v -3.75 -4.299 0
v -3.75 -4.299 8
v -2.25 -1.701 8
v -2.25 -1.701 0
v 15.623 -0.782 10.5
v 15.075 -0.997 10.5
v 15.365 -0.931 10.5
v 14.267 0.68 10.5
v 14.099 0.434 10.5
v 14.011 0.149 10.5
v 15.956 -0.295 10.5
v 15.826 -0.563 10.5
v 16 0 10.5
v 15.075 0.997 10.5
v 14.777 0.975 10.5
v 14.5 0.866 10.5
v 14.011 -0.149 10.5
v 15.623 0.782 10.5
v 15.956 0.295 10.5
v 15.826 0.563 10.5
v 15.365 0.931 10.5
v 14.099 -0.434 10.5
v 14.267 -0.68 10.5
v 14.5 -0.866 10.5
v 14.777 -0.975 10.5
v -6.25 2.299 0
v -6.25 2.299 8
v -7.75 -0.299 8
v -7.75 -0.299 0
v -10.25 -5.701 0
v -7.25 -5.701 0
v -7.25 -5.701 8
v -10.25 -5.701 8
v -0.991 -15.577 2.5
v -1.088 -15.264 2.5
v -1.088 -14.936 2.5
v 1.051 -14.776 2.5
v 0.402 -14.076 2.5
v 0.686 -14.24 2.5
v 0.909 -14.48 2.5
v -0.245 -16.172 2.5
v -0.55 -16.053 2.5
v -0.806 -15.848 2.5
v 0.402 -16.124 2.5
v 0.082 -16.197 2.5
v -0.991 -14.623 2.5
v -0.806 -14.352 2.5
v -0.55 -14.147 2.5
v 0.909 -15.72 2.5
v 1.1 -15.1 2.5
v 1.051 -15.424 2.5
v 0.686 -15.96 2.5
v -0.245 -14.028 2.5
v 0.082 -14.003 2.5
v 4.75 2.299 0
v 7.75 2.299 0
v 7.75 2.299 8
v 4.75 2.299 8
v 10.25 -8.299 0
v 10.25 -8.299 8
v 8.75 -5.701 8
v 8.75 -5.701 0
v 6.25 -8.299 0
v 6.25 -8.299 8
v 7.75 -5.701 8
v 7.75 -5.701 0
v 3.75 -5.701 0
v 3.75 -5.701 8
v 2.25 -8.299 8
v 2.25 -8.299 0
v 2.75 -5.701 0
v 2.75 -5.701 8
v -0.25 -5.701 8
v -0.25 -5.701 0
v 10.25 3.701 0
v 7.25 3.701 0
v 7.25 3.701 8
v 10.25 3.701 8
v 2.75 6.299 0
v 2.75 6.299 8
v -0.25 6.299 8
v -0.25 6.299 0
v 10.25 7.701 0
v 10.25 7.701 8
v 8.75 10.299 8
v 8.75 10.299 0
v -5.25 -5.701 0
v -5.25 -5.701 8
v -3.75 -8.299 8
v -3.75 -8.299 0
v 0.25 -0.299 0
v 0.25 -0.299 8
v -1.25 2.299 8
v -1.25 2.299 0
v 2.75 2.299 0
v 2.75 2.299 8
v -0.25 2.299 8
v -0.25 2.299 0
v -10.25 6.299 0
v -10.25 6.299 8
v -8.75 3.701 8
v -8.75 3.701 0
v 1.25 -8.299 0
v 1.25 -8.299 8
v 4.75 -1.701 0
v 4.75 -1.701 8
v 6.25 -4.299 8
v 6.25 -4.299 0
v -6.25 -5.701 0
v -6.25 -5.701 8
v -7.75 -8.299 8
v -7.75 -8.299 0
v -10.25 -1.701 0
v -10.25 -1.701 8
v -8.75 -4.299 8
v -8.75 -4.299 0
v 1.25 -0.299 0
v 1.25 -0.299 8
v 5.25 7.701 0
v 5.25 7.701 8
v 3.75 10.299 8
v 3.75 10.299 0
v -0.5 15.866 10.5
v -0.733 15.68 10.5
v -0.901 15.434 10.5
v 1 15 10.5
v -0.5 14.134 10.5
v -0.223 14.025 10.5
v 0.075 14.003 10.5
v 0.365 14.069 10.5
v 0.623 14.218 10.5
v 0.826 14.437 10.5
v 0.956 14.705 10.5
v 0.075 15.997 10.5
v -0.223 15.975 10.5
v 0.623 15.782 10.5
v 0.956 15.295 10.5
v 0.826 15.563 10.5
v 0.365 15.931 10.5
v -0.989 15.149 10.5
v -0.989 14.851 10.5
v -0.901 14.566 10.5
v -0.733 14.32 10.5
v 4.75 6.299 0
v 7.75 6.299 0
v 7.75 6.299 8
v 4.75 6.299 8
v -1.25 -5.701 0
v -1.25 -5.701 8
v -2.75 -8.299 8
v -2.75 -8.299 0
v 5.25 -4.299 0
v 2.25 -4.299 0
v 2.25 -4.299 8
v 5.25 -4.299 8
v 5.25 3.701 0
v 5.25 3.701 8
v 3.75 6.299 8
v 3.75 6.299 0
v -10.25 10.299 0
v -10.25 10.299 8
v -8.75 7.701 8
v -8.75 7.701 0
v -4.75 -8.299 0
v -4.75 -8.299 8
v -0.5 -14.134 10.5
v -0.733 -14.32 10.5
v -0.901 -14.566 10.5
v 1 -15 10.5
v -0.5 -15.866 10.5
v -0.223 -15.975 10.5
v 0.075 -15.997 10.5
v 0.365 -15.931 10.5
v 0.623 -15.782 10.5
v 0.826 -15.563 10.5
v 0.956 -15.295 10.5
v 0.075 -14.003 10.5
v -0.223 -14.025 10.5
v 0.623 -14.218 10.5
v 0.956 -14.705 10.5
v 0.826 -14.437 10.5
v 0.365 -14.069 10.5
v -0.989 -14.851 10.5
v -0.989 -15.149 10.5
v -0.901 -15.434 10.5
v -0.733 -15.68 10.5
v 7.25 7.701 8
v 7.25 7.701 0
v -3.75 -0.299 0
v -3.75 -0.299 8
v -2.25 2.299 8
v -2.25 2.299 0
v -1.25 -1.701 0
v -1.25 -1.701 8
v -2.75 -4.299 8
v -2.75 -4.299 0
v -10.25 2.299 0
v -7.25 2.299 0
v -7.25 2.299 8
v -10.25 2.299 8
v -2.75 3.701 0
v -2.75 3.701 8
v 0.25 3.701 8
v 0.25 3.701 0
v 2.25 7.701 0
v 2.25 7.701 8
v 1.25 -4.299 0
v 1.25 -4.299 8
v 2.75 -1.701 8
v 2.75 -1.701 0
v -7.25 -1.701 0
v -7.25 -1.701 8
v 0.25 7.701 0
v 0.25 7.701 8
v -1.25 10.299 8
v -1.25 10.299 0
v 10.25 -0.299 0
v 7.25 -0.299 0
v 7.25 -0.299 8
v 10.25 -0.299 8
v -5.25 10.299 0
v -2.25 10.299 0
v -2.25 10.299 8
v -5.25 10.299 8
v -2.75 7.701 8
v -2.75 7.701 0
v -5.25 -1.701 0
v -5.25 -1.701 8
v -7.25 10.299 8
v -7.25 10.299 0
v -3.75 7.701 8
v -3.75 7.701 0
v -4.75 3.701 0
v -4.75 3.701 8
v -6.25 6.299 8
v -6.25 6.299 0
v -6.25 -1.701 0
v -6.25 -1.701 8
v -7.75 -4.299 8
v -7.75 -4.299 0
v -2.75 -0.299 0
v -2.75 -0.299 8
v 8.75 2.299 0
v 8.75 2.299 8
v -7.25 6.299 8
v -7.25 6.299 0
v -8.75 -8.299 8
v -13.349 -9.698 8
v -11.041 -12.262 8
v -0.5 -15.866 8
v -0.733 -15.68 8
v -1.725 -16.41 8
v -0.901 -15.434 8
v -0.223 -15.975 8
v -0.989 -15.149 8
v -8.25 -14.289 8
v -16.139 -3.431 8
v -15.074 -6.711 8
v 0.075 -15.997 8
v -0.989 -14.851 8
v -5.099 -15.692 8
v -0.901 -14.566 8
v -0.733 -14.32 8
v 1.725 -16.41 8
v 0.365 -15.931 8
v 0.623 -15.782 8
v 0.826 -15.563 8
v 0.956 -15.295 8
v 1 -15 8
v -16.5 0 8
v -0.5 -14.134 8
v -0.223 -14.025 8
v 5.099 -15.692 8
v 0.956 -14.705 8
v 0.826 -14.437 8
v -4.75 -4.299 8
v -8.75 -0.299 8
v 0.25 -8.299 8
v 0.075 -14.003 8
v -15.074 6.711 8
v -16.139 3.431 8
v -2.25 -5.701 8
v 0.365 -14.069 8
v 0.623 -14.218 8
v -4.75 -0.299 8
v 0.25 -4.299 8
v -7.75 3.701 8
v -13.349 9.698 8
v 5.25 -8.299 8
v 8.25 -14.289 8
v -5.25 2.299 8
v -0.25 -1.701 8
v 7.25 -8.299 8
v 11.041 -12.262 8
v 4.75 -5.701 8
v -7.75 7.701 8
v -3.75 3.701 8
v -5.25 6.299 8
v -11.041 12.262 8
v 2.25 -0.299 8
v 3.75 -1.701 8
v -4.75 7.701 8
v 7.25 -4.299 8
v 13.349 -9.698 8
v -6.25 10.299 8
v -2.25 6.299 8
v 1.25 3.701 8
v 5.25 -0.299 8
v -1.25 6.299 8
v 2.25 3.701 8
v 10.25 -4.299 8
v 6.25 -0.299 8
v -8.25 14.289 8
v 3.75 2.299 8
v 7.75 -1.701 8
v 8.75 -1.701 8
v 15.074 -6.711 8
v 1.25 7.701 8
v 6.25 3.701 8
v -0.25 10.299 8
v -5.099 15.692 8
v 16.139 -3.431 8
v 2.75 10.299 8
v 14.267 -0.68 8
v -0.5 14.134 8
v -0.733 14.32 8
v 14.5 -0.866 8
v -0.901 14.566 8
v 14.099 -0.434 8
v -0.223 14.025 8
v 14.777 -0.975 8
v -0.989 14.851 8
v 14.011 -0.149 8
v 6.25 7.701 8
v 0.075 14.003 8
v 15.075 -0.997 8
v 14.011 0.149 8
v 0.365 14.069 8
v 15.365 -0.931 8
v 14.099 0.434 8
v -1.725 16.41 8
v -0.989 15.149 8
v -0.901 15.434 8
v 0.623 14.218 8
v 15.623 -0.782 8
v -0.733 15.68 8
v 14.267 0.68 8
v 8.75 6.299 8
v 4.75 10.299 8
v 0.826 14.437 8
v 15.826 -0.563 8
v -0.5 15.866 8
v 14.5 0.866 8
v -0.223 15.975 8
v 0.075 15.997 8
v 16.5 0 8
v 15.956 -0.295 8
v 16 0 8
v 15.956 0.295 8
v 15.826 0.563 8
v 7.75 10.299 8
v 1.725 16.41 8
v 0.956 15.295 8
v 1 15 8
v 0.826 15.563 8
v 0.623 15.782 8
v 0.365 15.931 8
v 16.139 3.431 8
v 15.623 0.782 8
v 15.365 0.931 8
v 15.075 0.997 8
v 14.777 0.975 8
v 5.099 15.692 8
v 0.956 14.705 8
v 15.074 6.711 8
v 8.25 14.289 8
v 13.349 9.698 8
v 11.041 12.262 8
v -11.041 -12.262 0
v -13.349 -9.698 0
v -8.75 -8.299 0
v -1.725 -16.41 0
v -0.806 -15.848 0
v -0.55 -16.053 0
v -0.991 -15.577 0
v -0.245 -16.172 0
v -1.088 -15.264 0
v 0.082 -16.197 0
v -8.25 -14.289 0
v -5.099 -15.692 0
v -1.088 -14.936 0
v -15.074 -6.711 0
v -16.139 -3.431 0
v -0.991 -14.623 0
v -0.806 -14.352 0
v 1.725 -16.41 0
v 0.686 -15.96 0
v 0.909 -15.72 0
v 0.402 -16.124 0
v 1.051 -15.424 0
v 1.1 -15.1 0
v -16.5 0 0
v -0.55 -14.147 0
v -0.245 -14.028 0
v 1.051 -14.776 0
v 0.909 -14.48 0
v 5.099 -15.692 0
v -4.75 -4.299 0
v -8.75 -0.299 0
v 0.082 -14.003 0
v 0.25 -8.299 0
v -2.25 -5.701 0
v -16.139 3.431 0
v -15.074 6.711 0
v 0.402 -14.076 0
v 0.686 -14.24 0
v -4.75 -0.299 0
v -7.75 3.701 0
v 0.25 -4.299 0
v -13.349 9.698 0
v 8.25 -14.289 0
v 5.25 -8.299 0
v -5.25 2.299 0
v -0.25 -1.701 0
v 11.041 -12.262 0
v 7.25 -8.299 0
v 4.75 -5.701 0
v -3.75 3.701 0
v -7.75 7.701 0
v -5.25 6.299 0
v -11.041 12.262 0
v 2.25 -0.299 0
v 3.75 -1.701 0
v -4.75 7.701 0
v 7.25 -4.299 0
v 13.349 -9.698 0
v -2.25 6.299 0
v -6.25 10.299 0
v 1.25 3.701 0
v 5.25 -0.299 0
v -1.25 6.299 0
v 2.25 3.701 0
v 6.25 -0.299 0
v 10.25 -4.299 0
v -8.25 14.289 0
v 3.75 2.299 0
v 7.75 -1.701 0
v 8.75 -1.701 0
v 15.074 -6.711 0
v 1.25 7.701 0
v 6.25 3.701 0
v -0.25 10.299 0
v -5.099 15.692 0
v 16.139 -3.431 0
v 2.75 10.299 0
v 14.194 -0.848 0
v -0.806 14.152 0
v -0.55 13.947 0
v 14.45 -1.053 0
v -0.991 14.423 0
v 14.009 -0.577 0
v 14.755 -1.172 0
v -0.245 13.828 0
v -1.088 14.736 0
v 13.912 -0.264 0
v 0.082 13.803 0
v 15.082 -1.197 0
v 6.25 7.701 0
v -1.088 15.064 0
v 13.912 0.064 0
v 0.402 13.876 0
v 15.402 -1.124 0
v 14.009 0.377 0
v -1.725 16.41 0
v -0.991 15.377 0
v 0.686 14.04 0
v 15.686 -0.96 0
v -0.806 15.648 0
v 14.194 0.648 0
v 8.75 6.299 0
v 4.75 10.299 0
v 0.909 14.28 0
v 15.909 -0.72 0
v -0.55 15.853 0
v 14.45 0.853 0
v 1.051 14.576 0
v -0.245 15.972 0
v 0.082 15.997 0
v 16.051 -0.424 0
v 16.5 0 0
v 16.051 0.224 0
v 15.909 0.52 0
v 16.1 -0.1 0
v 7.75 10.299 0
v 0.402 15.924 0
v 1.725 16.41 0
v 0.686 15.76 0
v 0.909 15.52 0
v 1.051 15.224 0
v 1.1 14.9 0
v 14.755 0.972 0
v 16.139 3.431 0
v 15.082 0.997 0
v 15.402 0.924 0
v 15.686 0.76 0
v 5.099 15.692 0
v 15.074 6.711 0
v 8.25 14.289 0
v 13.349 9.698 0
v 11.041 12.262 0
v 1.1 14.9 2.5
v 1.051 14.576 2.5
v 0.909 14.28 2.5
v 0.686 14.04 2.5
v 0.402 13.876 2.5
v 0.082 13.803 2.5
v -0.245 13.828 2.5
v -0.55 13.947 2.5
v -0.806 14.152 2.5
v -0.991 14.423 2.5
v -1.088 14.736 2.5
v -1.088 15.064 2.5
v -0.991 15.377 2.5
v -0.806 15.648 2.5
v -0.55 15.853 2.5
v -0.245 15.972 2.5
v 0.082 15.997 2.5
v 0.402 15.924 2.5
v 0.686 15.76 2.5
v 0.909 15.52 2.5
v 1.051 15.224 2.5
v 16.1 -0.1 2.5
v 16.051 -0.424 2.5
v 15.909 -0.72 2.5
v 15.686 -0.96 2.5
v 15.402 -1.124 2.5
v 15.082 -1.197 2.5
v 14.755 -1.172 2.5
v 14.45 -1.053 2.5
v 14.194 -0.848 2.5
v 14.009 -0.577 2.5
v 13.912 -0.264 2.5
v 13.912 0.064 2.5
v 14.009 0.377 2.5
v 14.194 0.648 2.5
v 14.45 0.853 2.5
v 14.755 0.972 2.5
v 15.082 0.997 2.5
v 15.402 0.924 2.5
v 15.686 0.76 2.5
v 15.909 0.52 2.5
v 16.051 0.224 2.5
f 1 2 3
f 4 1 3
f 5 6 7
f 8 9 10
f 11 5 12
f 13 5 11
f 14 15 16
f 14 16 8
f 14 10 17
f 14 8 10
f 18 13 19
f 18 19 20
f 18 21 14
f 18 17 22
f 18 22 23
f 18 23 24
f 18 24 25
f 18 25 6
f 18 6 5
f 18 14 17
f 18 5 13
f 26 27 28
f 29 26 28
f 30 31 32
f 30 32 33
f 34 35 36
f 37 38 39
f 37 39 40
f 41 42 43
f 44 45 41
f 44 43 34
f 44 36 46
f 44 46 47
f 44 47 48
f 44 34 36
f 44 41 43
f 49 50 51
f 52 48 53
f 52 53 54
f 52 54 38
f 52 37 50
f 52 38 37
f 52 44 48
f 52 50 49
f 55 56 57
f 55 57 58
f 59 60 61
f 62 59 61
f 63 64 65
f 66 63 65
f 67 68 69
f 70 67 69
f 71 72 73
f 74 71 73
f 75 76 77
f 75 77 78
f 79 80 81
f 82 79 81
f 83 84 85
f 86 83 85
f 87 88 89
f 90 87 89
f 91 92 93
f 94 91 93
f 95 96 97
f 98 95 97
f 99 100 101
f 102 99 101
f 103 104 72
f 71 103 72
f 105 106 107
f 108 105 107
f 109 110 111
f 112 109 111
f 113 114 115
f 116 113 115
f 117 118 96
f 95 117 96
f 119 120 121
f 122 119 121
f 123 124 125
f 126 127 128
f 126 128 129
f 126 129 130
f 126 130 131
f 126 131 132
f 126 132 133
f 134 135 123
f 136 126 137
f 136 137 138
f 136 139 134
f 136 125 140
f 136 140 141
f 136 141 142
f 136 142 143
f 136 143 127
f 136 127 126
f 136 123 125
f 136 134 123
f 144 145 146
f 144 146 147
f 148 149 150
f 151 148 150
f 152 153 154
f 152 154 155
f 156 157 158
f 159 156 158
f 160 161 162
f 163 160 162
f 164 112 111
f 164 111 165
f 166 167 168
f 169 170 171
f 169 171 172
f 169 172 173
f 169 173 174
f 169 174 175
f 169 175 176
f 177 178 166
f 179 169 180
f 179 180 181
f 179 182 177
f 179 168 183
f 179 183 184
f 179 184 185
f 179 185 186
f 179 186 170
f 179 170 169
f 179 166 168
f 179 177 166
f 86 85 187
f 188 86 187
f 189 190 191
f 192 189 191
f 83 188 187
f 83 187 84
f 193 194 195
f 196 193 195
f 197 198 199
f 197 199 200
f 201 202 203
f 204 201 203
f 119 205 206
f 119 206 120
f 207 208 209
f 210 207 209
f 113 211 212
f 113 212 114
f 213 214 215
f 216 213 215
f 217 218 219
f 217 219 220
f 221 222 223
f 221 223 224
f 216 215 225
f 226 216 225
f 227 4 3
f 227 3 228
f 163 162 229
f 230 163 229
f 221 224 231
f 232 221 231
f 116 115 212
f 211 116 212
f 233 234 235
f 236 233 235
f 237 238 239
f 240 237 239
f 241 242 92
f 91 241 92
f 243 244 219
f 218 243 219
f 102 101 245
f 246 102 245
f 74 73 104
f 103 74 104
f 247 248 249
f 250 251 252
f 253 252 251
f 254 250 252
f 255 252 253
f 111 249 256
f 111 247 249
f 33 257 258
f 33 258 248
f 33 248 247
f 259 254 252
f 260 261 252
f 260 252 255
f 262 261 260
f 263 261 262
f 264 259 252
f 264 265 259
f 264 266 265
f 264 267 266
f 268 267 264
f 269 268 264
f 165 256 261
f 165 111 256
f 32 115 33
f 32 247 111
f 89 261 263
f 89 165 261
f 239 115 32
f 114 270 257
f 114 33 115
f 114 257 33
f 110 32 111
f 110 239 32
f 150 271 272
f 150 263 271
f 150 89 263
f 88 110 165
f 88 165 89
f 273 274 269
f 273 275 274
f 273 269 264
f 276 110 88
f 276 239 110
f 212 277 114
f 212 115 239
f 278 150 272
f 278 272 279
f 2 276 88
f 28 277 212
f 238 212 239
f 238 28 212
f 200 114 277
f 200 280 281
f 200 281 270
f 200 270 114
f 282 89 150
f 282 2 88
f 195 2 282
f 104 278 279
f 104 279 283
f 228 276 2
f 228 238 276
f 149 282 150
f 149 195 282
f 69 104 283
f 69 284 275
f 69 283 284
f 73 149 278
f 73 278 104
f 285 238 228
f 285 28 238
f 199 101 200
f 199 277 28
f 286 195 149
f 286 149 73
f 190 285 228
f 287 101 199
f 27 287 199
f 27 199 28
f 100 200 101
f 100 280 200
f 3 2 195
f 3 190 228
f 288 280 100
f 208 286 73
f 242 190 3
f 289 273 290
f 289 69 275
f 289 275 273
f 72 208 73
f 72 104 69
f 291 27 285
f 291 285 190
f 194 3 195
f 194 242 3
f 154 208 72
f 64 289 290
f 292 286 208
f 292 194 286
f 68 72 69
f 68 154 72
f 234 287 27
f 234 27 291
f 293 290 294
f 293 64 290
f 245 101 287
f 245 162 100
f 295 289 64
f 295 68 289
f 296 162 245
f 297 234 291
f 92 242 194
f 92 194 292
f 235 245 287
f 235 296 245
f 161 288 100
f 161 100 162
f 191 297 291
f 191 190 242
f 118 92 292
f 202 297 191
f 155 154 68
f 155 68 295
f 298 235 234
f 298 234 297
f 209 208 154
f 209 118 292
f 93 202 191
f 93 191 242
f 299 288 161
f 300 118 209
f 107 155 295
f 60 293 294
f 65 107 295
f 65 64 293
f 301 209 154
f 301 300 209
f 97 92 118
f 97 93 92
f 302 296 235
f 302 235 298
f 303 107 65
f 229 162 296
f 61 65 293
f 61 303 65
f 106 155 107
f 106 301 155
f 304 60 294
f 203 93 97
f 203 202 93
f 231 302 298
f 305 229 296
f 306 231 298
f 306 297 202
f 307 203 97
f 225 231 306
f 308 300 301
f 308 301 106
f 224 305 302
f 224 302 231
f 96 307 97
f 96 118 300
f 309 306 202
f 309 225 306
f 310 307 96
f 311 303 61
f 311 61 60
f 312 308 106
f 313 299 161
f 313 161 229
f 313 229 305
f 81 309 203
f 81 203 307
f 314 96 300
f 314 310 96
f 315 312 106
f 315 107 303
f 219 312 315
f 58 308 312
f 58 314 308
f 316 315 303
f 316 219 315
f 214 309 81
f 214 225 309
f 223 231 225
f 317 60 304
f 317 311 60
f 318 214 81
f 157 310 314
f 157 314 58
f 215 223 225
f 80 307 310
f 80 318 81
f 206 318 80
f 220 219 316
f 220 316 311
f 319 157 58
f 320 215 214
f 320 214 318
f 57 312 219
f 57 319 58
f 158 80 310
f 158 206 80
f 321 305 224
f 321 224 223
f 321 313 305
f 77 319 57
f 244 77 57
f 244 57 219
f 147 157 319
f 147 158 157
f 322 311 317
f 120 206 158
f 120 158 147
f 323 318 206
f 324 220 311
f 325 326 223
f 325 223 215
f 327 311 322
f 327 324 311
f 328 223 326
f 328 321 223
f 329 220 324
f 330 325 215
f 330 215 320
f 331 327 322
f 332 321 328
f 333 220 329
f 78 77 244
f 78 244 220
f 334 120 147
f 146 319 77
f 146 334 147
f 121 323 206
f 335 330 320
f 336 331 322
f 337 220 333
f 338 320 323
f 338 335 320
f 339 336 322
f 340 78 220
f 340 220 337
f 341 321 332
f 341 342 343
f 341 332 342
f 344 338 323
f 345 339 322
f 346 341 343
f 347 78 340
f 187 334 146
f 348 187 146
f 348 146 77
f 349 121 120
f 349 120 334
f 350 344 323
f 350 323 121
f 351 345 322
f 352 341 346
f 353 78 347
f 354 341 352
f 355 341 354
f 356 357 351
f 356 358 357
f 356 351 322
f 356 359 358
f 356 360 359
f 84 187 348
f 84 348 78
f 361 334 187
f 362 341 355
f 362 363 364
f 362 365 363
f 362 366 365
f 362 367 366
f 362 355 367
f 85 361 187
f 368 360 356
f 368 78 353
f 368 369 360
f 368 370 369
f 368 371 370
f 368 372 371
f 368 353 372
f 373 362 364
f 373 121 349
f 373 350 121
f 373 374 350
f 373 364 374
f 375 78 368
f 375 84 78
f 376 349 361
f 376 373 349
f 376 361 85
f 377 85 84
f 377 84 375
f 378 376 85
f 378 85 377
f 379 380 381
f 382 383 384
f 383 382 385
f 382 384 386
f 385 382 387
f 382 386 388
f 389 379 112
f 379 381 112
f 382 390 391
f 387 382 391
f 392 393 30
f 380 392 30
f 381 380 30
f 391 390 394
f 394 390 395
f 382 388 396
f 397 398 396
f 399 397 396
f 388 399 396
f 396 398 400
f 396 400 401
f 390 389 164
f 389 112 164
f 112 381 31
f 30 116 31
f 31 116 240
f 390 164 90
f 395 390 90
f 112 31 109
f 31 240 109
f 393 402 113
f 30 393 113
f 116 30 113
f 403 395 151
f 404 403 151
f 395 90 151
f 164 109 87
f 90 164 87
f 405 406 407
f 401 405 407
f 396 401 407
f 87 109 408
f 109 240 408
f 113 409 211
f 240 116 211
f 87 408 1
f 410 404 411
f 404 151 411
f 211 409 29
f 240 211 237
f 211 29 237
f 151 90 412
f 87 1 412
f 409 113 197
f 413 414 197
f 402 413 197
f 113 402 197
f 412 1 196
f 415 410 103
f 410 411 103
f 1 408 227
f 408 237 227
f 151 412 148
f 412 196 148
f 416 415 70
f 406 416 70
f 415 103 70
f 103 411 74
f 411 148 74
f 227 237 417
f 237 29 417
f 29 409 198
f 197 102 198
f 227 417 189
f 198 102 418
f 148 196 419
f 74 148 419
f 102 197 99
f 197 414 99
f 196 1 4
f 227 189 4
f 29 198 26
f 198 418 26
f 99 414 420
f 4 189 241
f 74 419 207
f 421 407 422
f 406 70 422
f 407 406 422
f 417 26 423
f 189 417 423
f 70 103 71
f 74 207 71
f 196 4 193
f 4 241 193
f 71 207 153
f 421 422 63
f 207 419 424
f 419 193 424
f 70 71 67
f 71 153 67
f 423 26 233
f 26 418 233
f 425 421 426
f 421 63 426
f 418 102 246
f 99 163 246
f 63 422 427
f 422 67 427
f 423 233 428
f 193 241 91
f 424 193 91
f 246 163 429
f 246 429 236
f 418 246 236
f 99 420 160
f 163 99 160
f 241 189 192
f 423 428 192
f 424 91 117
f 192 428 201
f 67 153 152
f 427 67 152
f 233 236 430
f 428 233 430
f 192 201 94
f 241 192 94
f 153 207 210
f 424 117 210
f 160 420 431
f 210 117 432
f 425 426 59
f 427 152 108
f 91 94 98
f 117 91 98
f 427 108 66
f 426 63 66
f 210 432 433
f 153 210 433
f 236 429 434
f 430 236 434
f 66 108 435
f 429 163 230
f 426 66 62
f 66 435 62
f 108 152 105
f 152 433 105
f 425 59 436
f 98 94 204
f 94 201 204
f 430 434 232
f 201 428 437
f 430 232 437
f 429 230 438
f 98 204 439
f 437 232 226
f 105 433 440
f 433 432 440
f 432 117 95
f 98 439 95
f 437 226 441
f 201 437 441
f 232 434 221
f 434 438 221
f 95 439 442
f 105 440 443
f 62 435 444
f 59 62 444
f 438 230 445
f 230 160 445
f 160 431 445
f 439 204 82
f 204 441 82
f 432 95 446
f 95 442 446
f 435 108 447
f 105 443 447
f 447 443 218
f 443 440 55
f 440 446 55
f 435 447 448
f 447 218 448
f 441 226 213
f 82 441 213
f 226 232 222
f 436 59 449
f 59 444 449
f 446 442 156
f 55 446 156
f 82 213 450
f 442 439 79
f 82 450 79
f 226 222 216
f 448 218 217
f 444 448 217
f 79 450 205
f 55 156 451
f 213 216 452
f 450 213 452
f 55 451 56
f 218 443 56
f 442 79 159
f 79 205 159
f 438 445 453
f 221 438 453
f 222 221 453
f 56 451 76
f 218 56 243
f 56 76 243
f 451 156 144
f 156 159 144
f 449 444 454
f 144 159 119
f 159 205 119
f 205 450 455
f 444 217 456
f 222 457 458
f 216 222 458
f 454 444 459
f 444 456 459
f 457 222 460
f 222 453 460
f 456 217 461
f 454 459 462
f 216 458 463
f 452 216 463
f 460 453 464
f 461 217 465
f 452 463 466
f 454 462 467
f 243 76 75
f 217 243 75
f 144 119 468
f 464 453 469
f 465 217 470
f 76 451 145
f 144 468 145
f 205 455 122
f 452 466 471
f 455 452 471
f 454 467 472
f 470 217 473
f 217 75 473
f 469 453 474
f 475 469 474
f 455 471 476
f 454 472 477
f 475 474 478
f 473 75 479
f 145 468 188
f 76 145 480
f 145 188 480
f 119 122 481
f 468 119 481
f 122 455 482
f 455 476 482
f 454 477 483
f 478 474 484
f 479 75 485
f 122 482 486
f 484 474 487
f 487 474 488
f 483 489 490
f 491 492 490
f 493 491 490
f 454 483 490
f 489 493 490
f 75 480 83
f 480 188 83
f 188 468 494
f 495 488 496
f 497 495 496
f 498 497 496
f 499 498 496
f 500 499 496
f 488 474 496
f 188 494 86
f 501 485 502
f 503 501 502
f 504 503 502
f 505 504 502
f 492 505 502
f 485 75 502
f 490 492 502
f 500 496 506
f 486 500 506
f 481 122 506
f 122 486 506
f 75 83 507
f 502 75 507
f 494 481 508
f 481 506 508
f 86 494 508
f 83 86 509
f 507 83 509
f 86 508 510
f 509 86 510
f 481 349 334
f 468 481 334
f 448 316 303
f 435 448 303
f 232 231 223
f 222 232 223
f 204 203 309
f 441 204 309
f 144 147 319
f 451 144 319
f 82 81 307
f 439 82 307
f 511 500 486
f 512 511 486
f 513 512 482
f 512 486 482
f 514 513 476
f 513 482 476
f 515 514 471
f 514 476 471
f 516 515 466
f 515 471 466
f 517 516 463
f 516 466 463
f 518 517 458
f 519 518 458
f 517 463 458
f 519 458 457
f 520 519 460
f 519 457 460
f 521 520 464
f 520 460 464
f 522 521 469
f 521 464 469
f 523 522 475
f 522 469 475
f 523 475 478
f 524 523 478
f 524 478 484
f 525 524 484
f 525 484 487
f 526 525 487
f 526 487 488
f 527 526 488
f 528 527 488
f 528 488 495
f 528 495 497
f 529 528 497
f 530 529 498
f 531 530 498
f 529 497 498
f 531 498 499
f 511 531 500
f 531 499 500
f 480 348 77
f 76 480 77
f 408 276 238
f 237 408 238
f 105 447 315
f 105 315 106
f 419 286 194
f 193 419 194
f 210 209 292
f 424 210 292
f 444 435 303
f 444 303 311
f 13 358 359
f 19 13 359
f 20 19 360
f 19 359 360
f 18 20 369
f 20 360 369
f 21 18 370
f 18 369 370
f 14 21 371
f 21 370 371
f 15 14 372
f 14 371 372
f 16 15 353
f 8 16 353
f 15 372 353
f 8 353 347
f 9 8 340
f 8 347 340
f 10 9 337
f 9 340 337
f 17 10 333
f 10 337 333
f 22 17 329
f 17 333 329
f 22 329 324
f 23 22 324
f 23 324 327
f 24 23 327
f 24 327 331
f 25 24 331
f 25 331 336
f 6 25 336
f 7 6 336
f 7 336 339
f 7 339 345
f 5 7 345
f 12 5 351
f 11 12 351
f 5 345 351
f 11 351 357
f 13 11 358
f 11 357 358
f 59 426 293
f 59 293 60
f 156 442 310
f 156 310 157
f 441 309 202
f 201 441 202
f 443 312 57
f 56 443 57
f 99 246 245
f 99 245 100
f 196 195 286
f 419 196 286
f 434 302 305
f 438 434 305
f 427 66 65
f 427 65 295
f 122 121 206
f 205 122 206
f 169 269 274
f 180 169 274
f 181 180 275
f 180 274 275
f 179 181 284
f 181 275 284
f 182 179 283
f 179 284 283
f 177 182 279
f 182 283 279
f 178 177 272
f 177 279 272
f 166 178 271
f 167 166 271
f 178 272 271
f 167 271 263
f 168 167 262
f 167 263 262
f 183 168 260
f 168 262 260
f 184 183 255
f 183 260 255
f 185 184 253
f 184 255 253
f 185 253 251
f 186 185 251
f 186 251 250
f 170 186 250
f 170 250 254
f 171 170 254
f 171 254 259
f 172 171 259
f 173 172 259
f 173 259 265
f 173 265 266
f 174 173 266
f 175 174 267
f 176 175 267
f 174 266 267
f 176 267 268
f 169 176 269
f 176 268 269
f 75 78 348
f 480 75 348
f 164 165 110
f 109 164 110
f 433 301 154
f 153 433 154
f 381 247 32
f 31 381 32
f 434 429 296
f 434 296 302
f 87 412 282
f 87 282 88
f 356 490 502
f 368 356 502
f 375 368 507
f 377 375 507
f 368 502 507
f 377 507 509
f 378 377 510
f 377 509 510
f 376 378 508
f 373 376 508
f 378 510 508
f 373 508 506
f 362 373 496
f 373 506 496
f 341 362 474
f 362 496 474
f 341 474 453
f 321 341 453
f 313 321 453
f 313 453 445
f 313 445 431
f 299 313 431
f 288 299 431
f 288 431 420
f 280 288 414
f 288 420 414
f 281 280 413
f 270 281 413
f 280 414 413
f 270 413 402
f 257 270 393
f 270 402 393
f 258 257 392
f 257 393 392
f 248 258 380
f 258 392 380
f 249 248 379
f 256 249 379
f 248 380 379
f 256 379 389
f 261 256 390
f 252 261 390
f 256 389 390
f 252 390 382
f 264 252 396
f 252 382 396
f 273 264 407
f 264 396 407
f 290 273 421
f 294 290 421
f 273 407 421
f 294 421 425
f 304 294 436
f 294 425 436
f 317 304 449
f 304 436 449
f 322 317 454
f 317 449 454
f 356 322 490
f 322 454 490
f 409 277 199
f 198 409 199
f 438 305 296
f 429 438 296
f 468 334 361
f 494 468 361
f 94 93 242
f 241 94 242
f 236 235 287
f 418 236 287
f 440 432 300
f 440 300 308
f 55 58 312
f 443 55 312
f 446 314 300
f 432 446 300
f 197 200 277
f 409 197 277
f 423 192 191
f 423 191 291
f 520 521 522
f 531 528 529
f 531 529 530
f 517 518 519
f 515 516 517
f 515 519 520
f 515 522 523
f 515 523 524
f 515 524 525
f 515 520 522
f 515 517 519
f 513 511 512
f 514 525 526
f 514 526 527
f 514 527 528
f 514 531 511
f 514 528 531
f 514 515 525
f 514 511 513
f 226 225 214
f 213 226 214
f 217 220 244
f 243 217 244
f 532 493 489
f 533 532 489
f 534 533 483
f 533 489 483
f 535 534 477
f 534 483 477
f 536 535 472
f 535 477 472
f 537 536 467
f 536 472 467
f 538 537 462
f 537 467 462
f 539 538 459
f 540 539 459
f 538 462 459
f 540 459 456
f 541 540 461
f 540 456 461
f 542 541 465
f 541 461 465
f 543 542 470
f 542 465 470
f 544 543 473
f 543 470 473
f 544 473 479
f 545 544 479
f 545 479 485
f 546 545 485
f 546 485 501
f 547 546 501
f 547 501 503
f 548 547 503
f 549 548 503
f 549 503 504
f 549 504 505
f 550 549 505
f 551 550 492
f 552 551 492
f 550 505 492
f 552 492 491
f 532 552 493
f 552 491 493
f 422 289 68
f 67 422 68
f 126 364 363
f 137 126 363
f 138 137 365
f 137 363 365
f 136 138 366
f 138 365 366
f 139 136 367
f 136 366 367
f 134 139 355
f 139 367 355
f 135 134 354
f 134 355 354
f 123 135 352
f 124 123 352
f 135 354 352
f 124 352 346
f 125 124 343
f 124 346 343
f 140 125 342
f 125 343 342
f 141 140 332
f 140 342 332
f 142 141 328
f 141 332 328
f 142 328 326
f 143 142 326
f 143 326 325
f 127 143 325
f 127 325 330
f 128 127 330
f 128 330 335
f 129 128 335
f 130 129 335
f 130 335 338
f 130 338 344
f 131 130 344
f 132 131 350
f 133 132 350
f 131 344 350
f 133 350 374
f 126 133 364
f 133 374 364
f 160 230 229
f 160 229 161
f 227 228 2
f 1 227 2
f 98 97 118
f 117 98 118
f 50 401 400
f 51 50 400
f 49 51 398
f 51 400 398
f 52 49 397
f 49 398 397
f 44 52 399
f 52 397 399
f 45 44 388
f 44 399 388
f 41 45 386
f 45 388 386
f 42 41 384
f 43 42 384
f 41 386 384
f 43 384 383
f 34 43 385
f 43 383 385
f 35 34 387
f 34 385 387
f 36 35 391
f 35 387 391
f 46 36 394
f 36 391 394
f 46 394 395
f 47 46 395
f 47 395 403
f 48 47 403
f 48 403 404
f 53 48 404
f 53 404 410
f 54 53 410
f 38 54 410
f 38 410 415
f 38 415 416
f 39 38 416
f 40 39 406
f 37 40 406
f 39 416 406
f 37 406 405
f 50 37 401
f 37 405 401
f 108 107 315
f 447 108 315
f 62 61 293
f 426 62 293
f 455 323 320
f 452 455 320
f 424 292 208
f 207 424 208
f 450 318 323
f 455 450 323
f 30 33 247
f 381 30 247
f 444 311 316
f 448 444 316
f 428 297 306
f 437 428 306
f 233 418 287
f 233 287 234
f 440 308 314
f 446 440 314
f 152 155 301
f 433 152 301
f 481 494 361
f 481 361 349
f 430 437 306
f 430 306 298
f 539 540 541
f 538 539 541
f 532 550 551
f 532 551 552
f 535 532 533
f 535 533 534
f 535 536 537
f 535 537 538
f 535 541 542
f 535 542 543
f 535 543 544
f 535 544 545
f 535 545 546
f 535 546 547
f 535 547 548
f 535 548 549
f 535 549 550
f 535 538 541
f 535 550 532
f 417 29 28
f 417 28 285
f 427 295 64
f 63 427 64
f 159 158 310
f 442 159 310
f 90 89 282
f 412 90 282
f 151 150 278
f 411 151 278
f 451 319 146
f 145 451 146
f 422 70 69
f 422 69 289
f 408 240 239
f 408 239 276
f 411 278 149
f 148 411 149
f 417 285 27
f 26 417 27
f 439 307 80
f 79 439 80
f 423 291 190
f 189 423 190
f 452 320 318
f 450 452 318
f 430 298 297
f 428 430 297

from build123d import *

# Parameters (mm, degrees)
F0_R     = 16.5
F1_DEPTH = 8
F2_R     = 1.1
F3_DEPTH = 2.5
F4_R     = 1
F5_DEPTH = 2.5
F7_DEPTH = 25


with BuildPart() as f1:
    # F0 (on Top) → F1 (new body)
    with BuildSketch(Plane.XY):
        Circle(F0_R)
    extrude(amount=F1_DEPTH)

    # F2 (on face) → F3 (cut)
    with BuildSketch(Plane(origin=(0, 0, 0), x_dir=(1, 0, 0), z_dir=(0, 0, -1))):
        with Locations((0, 15.1)):
            Circle(F2_R)
        with Locations((15, 0.1)):
            Circle(F2_R)
        with Locations((0, -14.9)):
            Circle(F2_R)
    extrude(amount=-F3_DEPTH, mode=Mode.SUBTRACT)

    # F4 (on face) → F5 (join)
    with BuildSketch(Plane.XY.offset(8)):
        with Locations((0, 15)):
            Circle(F4_R)
        with Locations((15, 0)):
            Circle(F4_R)
        with Locations((0, -15)):
            Circle(F4_R)
    extrude(amount=F5_DEPTH)

    # F6 (on face) → F7 (cut)
    with BuildSketch(Plane.XY.offset(8)):
        Polygon((-7.25, -5.700962), (-10.25, -5.700962), (-8.75, -8.299038), align=None)
        Polygon((-6.25, -5.700962), (-7.75, -8.299038), (-4.75, -8.299038), align=None)
        Polygon((-7.25, -1.700962), (-10.25, -1.700962), (-8.75, -4.299038), align=None)
        Polygon((-6.25, -1.700962), (-7.75, -4.299038), (-4.75, -4.299038), align=None)
        Polygon((-7.25, 2.299038), (-10.25, 2.299038), (-8.75, -0.299038), align=None)
        Polygon((-6.25, 2.299038), (-7.75, -0.299038), (-4.75, -0.299038), align=None)
        Polygon((-7.25, 6.299038), (-10.25, 6.299038), (-8.75, 3.700962), align=None)
        Polygon((-6.25, 6.299038), (-7.75, 3.700962), (-4.75, 3.700962), align=None)
        Polygon((-7.25, 10.299038), (-10.25, 10.299038), (-8.75, 7.700962), align=None)
        Polygon((-6.25, 10.299038), (-7.75, 7.700962), (-4.75, 7.700962), align=None)
        Polygon((-2.25, -5.700962), (-5.25, -5.700962), (-3.75, -8.299038), align=None)
        Polygon((-1.25, -5.700962), (-2.75, -8.299038), (0.25, -8.299038), align=None)
        Polygon((-2.25, -1.700962), (-5.25, -1.700962), (-3.75, -4.299038), align=None)
        Polygon((-1.25, -1.700962), (-2.75, -4.299038), (0.25, -4.299038), align=None)
        Polygon((-2.25, 2.299038), (-5.25, 2.299038), (-3.75, -0.299038), align=None)
        Polygon((-1.25, 2.299038), (-2.75, -0.299038), (0.25, -0.299038), align=None)
        Polygon((-2.25, 6.299038), (-5.25, 6.299038), (-3.75, 3.700962), align=None)
        Polygon((-1.25, 6.299038), (-2.75, 3.700962), (0.25, 3.700962), align=None)
        Polygon((-2.25, 10.299038), (-5.25, 10.299038), (-3.75, 7.700962), align=None)
        Polygon((-1.25, 10.299038), (-2.75, 7.700962), (0.25, 7.700962), align=None)
        Polygon((2.75, -5.700962), (-0.25, -5.700962), (1.25, -8.299038), align=None)
        Polygon((3.75, -5.700962), (2.25, -8.299038), (5.25, -8.299038), align=None)
        Polygon((2.75, -1.700962), (-0.25, -1.700962), (1.25, -4.299038), align=None)
        Polygon((3.75, -1.700962), (2.25, -4.299038), (5.25, -4.299038), align=None)
        Polygon((2.75, 2.299038), (-0.25, 2.299038), (1.25, -0.299038), align=None)
        Polygon((3.75, 2.299038), (2.25, -0.299038), (5.25, -0.299038), align=None)
        Polygon((2.75, 6.299038), (-0.25, 6.299038), (1.25, 3.700962), align=None)
        Polygon((3.75, 6.299038), (2.25, 3.700962), (5.25, 3.700962), align=None)
        Polygon((2.75, 10.299038), (-0.25, 10.299038), (1.25, 7.700962), align=None)
        Polygon((3.75, 10.299038), (2.25, 7.700962), (5.25, 7.700962), align=None)
        Polygon((7.75, -5.700962), (4.75, -5.700962), (6.25, -8.299038), align=None)
        Polygon((8.75, -5.700962), (7.25, -8.299038), (10.25, -8.299038), align=None)
        Polygon((7.75, -1.700962), (4.75, -1.700962), (6.25, -4.299038), align=None)
        Polygon((8.75, -1.700962), (7.25, -4.299038), (10.25, -4.299038), align=None)
        Polygon((7.75, 2.299038), (4.75, 2.299038), (6.25, -0.299038), align=None)
        Polygon((8.75, 2.299038), (7.25, -0.299038), (10.25, -0.299038), align=None)
        Polygon((7.75, 6.299038), (4.75, 6.299038), (6.25, 3.700962), align=None)
        Polygon((8.75, 6.299038), (7.25, 3.700962), (10.25, 3.700962), align=None)
        Polygon((7.75, 10.299038), (4.75, 10.299038), (6.25, 7.700962), align=None)
        Polygon((8.75, 10.299038), (7.25, 7.700962), (10.25, 7.700962), align=None)
    extrude(amount=-F7_DEPTH, mode=Mode.SUBTRACT)


solid = f1.part
